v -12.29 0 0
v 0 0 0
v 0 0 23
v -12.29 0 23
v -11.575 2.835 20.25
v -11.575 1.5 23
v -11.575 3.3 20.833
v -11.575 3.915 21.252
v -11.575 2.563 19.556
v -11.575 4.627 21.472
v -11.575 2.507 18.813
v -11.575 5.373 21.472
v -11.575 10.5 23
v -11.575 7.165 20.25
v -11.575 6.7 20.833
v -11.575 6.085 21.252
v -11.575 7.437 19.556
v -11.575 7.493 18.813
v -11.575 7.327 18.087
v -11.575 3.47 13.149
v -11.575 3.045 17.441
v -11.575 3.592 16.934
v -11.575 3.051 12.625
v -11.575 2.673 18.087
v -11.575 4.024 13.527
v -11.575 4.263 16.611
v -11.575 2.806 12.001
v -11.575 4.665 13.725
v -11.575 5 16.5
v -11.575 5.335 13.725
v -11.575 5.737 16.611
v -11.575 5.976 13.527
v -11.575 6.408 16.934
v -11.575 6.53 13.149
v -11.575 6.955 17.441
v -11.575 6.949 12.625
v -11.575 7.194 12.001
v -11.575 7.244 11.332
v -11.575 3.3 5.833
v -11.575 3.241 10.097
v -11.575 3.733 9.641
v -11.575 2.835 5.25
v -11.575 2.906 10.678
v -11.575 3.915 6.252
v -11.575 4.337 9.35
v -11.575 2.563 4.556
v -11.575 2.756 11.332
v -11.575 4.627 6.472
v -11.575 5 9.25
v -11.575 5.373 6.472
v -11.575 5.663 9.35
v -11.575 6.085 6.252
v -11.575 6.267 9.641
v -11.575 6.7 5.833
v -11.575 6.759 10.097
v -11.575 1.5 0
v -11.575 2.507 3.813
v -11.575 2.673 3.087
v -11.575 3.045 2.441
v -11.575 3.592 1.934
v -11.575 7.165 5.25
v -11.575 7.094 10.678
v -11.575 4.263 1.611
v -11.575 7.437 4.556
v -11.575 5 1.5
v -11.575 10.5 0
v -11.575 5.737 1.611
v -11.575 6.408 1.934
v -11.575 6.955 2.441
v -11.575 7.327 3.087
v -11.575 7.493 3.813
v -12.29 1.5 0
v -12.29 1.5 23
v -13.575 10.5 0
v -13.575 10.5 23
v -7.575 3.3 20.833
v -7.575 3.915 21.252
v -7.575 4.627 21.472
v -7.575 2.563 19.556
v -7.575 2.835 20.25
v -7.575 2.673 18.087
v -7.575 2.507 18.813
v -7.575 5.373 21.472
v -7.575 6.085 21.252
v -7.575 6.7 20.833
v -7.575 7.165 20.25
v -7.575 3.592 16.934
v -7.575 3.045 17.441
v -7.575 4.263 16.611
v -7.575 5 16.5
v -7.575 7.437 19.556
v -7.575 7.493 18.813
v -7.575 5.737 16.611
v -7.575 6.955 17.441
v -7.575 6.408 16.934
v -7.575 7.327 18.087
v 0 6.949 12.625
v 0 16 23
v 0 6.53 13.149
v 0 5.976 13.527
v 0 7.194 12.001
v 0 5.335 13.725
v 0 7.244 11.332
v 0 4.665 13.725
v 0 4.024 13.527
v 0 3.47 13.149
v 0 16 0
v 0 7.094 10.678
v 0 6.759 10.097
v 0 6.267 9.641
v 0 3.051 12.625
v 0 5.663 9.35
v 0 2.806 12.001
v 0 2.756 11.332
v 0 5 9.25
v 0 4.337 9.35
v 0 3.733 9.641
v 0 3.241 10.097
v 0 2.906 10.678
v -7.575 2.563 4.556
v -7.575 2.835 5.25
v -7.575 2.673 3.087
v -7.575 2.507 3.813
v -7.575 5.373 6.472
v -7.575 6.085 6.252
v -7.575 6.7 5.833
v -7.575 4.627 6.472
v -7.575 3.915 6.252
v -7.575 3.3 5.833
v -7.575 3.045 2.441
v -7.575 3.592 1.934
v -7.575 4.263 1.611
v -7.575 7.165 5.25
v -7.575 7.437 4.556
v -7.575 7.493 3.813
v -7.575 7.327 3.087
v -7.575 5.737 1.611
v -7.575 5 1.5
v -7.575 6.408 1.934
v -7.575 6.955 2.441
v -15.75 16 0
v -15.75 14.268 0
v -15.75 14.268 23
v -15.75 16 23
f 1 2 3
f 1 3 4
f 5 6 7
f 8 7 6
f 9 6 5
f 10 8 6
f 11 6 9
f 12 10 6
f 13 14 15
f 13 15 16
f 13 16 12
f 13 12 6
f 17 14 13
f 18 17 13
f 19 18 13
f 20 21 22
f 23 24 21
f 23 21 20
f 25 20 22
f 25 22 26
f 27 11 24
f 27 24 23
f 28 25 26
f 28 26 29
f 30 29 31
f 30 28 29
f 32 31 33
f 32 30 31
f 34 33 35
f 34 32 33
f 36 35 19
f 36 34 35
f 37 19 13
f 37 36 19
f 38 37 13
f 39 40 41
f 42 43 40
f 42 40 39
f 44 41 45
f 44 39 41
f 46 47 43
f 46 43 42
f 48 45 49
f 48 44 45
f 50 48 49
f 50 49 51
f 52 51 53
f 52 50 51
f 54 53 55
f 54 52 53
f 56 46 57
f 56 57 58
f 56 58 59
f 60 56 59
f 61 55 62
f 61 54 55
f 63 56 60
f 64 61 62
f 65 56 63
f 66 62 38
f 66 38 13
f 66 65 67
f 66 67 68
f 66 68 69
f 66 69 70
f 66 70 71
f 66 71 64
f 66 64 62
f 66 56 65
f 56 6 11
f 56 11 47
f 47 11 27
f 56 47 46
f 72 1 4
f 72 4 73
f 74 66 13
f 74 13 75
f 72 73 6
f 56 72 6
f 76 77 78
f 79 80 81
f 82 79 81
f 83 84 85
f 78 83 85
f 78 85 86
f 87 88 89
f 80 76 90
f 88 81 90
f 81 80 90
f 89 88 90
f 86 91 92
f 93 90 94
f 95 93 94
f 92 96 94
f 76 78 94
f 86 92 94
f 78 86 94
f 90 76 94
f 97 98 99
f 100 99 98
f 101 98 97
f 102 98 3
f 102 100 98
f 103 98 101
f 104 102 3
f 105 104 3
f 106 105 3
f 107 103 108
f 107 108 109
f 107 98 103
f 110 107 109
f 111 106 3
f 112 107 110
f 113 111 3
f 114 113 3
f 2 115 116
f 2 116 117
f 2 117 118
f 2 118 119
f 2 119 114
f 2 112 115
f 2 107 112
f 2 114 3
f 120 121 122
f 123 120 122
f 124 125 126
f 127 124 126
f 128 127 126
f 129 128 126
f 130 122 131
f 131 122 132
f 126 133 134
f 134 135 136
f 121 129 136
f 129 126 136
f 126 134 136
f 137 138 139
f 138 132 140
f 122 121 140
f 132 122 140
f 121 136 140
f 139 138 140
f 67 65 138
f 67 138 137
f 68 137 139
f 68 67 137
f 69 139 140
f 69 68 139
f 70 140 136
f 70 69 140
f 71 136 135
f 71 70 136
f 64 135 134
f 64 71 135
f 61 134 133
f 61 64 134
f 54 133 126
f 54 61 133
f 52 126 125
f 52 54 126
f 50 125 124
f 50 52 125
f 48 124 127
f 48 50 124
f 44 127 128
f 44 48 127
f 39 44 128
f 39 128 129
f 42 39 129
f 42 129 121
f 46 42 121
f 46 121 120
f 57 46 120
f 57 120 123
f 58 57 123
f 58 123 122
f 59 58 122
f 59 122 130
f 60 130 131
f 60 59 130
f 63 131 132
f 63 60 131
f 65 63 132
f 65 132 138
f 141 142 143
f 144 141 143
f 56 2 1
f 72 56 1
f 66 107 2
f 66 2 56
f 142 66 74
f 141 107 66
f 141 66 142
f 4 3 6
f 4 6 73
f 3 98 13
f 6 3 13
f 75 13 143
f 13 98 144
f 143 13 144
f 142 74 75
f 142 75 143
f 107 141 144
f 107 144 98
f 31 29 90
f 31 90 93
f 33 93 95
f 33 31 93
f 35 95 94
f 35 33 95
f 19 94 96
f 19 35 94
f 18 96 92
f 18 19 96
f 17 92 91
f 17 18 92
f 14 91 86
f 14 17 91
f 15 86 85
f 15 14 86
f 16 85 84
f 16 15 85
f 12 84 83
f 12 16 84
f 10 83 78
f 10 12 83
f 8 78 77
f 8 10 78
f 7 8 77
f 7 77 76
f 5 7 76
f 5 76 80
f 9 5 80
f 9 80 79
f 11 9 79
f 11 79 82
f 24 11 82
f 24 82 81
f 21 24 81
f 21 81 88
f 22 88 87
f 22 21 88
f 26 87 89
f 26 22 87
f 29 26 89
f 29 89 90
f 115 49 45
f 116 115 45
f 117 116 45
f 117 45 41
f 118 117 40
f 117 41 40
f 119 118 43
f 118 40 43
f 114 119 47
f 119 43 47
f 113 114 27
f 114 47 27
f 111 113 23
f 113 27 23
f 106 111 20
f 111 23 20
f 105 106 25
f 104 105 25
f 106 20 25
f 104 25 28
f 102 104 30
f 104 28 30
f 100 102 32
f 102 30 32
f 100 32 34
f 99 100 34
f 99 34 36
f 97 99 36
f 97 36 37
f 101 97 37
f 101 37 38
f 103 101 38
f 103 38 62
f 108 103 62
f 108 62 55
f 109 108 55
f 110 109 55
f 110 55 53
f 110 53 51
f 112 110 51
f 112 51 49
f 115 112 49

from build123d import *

# Parameters (mm, degrees)
EXTRUDE_1_DEPTH          = 23
SKETCH_2_R               = 2.5
CUT_EXTRUDE_1_DEPTH      = 4
CUT_EXTRUDE_1_DEPTH_BACK = 6.175426481
HOLE_WIZARD_M41_D        = 4.5
CHAMFER_1_SIZE           = 1
CHAMFER_1_SIZE2          = 2


with BuildPart() as part:
    # Эскиз1 → Бобышка-Вытянуть1 (new body)
    with BuildSketch(Plane.XY):
        Polygon((0, 0), (-12.29, 0), (-12.29, 1.5), (-11.574573519, 1.5), (-11.574573519, 10.5), (-13.574573519, 10.5), (-16.75, 16), (0, 16), align=None)
    extrude(amount=EXTRUDE_1_DEPTH)

    # Эскиз2 → Вырез-Вытянуть1 (cut, two sides)
    with BuildSketch(Plane(origin=(-11.574573519, 0, 0), x_dir=(0, 0, -1), z_dir=(1, 0, 0))) as cut_extrude_1_sk:
        with Locations((-19, 5)):
            Circle(SKETCH_2_R)
        with Locations((-4, 5)):
            Circle(SKETCH_2_R)
    extrude(amount=CUT_EXTRUDE_1_DEPTH, mode=Mode.SUBTRACT)
    extrude(cut_extrude_1_sk.sketch, amount=-CUT_EXTRUDE_1_DEPTH_BACK, mode=Mode.SUBTRACT)

    # Отверстие с зазором M41 (through all)
    with Locations(Plane(origin=(0, 1.542761086, 4.525415006), x_dir=(0, 0, 1), z_dir=(1, 0, 0))):
        with Locations((6.974584994, -3.457238914)):
            Hole(HOLE_WIZARD_M41_D / 2)

    # Фаска1
    chamfer_1_edges = [part.edges().sort_by_distance(p)[0] for p in [
        (-16.75, 16, 11.5),
    ]]
    chamfer_1_side = [part.faces().sort_by_distance(p)[0] for p in [
        (-8.375, 16, 11.5),
    ]]
    chamfer(chamfer_1_edges, length=CHAMFER_1_SIZE, length2=CHAMFER_1_SIZE2, reference=chamfer_1_side[0])


solid = part.part
